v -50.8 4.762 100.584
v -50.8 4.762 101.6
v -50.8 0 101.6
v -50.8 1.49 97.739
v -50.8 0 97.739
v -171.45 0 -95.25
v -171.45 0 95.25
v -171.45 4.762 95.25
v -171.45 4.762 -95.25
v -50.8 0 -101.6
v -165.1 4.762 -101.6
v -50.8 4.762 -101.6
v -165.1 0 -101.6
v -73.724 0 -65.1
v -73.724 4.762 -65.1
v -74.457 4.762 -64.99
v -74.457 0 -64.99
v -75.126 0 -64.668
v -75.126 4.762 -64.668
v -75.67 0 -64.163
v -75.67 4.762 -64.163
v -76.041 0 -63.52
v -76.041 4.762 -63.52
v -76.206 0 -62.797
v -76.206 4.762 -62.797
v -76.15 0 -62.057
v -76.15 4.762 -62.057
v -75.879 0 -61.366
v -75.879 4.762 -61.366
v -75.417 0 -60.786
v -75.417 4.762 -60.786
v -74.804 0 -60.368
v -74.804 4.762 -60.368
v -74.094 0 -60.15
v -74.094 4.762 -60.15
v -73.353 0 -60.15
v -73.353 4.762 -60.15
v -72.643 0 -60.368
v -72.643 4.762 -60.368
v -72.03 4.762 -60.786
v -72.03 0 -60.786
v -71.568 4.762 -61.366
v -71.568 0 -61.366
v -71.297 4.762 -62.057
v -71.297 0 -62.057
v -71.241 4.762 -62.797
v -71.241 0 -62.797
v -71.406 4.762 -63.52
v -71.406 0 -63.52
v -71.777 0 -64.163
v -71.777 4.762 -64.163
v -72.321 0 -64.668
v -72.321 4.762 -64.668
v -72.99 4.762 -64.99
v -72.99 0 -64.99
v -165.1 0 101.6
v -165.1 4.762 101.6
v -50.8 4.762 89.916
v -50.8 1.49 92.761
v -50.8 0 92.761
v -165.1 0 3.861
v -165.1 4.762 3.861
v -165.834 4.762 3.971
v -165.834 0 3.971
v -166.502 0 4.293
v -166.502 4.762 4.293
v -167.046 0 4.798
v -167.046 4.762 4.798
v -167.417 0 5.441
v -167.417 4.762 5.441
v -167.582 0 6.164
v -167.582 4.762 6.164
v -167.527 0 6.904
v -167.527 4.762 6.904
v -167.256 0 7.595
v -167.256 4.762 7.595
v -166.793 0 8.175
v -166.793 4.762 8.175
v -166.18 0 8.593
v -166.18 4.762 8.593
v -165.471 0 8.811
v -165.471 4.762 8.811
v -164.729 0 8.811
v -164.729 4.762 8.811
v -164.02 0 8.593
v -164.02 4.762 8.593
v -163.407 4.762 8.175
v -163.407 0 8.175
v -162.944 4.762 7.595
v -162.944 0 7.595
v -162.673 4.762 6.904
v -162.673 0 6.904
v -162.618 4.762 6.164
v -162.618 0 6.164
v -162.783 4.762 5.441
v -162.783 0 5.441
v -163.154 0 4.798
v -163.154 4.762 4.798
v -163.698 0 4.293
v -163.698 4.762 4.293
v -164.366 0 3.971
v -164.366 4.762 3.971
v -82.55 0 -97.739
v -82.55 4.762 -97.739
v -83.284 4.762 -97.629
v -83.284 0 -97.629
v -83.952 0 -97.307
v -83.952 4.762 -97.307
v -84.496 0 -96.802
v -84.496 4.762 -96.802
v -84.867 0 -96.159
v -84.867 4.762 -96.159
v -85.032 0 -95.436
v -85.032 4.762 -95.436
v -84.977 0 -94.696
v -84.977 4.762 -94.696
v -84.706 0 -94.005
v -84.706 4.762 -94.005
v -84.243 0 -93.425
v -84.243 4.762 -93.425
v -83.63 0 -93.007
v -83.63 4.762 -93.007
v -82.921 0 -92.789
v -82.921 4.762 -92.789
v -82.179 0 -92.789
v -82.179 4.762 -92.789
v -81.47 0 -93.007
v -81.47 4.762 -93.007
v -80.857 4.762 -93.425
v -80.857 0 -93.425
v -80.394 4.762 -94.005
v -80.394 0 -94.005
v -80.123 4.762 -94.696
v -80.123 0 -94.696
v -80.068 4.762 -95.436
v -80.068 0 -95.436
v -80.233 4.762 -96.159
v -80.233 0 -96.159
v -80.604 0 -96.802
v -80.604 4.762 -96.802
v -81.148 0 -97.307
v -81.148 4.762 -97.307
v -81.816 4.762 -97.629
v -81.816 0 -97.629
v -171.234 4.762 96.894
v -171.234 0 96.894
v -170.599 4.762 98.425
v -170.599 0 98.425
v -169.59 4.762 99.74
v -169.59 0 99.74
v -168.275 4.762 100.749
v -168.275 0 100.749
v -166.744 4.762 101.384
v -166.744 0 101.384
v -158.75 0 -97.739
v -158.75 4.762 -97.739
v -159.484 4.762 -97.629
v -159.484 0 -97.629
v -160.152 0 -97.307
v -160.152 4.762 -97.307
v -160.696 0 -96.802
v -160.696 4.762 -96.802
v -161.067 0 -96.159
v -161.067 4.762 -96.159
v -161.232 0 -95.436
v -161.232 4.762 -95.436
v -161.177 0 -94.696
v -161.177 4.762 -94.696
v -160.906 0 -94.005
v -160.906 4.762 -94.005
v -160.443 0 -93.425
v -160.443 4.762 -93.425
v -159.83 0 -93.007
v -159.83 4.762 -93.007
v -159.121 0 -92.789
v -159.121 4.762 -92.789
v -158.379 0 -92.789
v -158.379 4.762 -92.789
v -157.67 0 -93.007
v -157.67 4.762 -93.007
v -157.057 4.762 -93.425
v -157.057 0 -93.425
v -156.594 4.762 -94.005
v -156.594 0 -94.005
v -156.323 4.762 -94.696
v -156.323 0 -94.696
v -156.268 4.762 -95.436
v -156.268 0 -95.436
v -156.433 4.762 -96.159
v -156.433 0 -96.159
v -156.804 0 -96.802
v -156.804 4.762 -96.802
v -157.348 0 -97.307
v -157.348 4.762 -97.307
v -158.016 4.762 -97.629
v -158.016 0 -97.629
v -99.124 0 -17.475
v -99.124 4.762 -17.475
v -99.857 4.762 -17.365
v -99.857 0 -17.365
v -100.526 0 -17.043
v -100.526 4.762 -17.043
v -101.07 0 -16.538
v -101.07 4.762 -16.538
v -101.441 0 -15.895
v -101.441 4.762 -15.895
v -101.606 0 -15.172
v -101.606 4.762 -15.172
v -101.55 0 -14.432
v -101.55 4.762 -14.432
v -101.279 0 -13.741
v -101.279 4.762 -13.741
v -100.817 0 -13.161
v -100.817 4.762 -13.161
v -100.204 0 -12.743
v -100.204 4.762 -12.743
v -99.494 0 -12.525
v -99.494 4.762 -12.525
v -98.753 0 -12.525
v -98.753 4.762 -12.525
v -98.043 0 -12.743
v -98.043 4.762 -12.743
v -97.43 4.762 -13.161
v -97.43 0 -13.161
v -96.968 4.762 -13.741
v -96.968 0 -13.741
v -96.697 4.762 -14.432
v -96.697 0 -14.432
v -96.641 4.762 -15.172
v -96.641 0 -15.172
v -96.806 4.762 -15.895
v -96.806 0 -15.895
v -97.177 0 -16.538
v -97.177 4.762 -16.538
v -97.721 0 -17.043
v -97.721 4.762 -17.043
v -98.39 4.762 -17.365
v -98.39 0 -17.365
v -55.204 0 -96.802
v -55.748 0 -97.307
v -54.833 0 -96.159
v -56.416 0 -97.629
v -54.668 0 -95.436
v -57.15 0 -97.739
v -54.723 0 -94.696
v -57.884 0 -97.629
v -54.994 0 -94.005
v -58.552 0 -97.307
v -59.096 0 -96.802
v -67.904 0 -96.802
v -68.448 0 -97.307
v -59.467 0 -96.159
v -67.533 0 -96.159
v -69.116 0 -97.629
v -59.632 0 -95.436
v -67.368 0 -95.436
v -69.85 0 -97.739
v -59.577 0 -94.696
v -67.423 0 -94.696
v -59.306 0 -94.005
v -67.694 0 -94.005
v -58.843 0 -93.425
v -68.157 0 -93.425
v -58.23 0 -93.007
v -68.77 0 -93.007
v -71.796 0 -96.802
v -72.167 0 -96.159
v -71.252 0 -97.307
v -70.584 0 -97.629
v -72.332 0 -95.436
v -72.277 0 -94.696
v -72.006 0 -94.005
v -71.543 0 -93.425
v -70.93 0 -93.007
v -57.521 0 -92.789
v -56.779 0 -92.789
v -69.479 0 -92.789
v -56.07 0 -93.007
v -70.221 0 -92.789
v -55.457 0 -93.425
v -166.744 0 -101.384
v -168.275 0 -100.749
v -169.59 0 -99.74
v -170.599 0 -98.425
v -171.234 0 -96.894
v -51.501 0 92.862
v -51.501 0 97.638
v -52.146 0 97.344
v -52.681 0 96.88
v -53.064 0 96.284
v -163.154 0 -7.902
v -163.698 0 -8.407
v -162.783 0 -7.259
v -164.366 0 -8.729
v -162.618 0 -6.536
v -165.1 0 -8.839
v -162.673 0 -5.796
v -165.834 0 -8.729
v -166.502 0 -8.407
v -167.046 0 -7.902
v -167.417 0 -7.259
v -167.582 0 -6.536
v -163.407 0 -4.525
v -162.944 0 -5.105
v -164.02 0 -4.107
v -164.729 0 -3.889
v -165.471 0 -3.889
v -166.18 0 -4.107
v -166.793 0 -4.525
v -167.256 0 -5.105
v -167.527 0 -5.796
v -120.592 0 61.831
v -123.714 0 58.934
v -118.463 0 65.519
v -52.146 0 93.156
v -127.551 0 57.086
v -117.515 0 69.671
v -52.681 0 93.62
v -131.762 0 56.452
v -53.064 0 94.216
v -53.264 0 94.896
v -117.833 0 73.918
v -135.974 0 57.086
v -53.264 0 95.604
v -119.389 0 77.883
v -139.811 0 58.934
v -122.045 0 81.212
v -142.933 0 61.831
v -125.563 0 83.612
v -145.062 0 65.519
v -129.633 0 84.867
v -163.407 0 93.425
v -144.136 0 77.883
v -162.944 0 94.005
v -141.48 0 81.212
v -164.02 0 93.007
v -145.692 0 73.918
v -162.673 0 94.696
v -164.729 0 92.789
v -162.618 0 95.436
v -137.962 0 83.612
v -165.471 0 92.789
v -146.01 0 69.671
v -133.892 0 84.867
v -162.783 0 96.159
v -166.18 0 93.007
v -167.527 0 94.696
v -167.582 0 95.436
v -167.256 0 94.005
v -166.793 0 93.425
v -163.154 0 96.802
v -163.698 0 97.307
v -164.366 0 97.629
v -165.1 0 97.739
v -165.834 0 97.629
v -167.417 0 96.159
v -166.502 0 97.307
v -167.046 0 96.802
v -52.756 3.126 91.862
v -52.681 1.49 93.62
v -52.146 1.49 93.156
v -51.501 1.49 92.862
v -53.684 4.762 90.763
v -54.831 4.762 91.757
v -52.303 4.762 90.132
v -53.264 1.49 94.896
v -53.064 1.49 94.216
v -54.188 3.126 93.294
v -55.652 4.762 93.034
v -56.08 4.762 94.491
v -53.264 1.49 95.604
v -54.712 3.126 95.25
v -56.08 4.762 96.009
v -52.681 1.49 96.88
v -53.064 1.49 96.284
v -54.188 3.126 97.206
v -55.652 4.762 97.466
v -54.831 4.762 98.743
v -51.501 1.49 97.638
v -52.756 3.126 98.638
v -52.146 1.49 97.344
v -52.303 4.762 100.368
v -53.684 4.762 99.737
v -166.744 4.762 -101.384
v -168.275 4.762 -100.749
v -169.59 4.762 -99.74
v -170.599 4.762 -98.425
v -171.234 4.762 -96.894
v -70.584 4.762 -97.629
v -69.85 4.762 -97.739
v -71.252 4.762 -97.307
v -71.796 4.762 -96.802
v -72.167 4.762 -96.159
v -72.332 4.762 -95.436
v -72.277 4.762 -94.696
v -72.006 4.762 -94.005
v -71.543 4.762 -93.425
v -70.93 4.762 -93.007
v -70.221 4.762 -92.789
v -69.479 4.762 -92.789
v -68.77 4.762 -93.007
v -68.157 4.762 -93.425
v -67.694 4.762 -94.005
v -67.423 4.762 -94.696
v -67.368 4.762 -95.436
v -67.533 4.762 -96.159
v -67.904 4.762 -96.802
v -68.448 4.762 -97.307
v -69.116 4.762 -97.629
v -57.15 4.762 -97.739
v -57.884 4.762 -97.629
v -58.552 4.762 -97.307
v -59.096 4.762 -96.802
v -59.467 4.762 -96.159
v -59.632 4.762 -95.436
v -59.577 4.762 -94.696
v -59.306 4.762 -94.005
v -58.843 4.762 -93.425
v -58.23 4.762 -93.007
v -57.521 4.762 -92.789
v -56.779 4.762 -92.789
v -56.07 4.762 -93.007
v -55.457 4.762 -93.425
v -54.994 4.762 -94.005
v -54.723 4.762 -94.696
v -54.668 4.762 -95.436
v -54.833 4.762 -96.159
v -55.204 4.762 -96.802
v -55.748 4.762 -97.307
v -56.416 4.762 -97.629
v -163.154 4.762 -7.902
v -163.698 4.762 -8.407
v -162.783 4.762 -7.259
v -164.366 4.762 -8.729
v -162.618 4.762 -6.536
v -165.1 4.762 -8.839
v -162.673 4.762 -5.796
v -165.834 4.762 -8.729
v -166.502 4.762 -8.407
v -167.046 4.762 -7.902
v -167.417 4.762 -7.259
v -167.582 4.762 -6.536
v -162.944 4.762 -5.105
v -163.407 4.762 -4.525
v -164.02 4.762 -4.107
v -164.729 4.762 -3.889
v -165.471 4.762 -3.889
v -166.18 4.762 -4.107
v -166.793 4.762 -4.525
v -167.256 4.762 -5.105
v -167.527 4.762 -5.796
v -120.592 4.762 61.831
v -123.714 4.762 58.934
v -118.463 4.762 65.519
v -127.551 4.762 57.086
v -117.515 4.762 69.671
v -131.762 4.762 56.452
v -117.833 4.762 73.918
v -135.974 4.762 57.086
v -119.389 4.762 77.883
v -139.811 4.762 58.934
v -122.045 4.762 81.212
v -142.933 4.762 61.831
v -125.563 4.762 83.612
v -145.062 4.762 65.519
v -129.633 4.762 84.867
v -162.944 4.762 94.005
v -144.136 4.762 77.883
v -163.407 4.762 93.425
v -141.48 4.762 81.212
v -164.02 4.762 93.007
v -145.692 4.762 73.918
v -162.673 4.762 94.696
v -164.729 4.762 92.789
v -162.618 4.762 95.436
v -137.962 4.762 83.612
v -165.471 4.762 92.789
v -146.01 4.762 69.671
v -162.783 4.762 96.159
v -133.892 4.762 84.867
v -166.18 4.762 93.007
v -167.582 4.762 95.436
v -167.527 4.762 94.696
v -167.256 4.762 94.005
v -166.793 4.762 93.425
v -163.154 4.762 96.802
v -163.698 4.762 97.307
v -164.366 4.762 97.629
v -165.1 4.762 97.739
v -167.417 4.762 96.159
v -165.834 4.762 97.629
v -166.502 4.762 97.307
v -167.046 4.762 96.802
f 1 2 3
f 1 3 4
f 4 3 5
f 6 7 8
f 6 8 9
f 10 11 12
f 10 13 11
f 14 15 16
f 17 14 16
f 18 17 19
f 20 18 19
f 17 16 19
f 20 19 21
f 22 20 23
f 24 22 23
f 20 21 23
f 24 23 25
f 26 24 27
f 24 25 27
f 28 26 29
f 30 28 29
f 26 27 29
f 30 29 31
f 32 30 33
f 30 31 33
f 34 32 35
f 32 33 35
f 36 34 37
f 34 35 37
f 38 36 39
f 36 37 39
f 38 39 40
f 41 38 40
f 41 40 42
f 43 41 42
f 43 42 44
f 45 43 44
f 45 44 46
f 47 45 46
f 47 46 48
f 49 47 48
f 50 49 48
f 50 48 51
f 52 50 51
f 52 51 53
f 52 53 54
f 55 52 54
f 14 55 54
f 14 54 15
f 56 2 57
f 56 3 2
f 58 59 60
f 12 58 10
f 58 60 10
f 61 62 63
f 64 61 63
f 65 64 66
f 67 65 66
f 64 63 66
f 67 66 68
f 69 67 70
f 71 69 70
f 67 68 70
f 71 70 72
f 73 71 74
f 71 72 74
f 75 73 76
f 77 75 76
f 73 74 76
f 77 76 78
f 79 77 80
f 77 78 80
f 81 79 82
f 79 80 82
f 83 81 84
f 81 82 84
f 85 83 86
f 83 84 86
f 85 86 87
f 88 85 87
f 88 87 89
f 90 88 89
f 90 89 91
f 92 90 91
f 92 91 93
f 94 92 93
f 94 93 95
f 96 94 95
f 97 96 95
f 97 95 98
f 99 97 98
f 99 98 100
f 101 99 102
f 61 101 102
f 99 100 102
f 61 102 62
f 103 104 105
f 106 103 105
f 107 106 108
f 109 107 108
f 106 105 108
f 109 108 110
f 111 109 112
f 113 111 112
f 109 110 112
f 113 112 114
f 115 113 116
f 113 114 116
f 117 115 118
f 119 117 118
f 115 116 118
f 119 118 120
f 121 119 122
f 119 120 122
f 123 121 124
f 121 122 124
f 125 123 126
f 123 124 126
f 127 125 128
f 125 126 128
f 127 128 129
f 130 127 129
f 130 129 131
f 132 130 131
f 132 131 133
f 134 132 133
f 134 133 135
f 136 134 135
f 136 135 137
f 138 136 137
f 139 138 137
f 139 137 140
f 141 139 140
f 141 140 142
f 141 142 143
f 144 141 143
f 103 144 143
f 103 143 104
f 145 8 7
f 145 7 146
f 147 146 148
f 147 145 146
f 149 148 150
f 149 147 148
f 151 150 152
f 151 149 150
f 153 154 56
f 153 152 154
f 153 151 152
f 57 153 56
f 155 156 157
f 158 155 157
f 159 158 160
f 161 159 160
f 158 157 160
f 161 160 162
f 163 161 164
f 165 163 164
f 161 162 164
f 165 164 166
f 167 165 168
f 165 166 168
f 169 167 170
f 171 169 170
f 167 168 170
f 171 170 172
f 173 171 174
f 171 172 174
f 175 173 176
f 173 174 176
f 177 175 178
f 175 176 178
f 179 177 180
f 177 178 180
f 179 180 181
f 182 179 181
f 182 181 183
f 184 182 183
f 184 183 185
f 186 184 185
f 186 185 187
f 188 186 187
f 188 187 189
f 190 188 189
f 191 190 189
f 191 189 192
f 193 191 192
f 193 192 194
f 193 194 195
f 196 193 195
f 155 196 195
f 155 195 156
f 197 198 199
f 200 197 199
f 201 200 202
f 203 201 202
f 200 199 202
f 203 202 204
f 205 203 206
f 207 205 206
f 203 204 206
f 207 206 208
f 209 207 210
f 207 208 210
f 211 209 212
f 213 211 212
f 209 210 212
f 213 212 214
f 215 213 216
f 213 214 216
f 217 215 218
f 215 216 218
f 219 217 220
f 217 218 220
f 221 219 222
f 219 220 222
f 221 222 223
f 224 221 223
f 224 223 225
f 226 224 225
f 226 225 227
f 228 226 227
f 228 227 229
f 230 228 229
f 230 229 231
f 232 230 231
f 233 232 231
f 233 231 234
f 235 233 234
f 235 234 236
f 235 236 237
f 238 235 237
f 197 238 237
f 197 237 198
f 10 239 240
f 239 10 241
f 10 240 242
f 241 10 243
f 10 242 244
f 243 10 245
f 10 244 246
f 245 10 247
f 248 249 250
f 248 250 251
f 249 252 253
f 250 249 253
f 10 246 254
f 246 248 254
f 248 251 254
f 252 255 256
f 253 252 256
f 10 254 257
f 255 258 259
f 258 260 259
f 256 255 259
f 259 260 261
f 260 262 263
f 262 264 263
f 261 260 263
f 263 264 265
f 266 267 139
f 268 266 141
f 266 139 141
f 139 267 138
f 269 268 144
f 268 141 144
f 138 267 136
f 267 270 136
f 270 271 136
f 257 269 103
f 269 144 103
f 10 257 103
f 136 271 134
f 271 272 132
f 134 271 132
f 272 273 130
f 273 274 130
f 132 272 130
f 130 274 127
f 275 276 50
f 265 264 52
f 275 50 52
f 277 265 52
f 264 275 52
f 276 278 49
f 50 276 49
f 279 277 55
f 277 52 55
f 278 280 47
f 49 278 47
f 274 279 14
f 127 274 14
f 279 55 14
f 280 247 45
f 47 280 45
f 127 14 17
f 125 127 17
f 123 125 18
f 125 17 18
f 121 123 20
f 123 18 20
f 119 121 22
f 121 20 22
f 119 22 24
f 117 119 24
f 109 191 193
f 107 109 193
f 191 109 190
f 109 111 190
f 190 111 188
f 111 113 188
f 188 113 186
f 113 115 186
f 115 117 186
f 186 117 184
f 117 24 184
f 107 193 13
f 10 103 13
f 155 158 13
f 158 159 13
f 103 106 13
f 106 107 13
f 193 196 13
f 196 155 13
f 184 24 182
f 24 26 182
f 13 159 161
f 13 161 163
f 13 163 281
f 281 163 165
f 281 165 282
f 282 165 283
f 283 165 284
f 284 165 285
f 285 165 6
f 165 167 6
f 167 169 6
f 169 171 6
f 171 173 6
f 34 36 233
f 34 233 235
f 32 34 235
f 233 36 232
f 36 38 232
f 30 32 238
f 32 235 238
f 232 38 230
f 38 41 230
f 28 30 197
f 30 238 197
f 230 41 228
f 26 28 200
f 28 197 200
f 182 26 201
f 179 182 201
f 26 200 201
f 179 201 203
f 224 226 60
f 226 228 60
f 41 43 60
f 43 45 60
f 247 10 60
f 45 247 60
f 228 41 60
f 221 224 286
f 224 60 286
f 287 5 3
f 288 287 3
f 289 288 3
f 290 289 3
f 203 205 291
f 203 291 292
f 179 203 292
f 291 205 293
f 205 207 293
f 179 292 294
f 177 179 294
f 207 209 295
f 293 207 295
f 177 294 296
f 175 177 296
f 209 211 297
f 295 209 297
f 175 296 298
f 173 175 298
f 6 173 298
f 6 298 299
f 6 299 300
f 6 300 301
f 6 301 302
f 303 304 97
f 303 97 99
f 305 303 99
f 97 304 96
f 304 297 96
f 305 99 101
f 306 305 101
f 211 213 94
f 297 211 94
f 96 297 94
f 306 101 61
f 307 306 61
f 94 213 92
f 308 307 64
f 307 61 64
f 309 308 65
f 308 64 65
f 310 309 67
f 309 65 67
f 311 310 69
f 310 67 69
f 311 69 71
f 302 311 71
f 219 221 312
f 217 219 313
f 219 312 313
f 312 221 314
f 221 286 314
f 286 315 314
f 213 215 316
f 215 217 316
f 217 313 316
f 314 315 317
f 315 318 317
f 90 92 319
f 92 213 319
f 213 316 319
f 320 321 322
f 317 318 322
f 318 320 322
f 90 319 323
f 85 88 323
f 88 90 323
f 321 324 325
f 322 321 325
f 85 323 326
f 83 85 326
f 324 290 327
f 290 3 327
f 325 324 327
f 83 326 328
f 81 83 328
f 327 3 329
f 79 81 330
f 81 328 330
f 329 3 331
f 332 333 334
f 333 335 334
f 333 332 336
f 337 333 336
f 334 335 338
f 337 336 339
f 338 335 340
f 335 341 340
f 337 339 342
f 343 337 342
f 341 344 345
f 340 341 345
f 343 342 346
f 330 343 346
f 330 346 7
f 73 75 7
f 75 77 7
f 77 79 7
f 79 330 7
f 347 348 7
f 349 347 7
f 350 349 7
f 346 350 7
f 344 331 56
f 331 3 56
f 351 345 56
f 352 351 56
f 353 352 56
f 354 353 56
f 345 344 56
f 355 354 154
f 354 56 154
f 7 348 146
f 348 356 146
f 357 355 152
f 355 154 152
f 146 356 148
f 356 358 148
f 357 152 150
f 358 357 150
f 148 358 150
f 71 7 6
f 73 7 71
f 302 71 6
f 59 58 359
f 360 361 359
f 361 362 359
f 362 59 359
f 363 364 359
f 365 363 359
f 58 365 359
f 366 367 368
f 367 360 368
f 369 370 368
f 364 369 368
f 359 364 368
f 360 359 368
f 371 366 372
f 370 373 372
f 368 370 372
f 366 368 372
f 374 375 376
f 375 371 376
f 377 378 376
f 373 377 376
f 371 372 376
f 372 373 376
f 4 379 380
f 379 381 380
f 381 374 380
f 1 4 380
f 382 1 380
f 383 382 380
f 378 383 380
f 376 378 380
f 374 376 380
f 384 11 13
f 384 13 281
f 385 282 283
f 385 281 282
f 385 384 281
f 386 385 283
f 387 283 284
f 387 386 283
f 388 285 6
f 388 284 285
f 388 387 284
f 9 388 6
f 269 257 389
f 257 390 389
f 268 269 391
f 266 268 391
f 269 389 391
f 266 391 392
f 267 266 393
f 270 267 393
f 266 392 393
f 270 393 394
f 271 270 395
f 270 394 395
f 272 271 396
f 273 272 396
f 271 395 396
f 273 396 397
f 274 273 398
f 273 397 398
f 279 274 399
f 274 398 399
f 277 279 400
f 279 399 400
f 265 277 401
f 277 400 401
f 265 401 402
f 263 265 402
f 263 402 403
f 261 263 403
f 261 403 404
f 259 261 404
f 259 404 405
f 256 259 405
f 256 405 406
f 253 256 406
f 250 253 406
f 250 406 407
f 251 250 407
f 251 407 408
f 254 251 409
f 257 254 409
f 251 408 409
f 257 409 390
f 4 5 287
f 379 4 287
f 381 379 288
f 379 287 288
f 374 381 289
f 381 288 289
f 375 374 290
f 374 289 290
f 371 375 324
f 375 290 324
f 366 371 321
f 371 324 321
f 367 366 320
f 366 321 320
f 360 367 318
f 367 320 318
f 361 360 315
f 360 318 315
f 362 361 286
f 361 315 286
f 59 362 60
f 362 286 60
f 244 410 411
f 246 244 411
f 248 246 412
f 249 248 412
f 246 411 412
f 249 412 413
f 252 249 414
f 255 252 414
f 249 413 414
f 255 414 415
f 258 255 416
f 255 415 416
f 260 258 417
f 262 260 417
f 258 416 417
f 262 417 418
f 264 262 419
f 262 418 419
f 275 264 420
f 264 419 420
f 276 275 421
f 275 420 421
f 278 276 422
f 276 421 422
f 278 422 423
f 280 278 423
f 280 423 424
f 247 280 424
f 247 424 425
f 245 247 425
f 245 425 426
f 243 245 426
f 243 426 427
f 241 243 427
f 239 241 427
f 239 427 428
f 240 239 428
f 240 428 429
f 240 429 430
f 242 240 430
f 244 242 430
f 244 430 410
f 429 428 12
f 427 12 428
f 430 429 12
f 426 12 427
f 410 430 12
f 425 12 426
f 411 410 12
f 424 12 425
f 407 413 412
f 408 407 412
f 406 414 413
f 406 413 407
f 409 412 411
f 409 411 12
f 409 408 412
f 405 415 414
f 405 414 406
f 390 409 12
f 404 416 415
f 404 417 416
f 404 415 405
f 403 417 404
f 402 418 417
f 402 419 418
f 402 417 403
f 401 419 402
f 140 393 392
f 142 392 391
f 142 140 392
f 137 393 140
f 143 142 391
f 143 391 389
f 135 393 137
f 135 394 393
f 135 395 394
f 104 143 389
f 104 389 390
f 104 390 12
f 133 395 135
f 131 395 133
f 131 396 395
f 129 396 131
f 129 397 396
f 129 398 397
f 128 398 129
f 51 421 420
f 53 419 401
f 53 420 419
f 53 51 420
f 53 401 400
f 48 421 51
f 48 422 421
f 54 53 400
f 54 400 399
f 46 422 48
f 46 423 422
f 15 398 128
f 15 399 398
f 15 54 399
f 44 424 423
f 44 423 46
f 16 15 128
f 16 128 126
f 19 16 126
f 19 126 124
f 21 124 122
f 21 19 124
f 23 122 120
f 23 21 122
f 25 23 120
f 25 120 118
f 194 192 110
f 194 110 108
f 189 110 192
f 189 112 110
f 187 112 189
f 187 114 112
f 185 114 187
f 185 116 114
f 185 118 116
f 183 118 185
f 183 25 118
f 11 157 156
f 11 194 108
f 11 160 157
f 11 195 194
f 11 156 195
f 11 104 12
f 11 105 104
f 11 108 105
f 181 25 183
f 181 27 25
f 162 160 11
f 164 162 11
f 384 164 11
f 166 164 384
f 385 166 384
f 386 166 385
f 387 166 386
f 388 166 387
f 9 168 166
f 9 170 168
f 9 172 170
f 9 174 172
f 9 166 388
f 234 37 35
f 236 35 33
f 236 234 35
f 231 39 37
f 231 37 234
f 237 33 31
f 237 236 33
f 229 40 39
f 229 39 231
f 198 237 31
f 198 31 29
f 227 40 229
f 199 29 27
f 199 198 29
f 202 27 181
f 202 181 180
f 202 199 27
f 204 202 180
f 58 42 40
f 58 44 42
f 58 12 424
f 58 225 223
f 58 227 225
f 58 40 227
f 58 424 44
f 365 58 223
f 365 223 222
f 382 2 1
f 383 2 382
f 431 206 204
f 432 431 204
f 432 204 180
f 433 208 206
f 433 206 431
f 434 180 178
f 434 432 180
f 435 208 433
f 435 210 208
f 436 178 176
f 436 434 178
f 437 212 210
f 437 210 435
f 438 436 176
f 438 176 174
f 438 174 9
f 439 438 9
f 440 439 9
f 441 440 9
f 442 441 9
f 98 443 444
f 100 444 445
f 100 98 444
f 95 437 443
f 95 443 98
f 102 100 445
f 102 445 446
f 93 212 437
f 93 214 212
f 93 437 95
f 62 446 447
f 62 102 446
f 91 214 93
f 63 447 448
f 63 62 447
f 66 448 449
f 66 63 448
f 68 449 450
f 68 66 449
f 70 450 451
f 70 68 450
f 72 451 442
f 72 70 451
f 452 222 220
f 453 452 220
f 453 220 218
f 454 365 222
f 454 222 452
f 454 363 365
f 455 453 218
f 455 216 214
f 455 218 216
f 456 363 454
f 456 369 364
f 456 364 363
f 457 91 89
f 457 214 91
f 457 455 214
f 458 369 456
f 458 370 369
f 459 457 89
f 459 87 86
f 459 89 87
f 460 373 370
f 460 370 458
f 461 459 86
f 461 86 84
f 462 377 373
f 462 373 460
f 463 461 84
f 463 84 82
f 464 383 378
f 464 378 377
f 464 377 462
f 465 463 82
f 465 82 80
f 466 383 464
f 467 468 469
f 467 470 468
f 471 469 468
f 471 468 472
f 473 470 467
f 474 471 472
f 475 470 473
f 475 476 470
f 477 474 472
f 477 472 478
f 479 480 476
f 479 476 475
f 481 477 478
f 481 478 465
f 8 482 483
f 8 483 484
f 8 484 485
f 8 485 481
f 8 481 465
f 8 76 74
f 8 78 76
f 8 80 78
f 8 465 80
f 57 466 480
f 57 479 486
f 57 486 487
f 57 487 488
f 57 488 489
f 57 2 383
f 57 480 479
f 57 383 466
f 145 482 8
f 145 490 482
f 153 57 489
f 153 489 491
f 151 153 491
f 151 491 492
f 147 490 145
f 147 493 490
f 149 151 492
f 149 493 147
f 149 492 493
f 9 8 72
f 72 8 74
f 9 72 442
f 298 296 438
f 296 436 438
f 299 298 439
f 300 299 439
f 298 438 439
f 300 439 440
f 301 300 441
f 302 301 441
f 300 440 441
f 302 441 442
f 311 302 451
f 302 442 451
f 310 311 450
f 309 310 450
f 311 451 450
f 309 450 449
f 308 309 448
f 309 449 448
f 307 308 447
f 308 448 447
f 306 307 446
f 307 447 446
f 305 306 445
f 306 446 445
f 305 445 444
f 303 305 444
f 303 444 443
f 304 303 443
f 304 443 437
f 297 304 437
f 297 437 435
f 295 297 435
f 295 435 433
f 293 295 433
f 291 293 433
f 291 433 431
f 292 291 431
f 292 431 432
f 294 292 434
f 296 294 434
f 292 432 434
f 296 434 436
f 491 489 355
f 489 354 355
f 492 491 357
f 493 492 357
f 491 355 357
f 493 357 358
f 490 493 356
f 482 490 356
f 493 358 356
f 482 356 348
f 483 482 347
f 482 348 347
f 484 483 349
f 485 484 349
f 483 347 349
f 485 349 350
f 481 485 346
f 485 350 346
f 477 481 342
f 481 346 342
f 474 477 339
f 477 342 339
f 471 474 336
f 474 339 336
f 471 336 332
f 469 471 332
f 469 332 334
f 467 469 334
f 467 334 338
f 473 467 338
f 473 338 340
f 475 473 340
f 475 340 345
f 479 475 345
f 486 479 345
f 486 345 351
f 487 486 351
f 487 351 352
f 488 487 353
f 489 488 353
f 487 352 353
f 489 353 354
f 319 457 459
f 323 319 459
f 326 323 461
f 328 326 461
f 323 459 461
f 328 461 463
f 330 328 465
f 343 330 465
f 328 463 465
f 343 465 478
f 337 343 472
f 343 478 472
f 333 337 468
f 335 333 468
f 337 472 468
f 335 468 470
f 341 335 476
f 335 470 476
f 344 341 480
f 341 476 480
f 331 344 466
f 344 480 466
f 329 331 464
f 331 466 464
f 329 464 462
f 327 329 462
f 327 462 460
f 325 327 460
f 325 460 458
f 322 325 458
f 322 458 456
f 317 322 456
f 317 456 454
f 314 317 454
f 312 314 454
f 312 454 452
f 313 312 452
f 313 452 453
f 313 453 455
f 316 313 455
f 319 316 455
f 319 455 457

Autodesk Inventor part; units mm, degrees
ref_plane "YZ Plane" through (0, 0, 0) normal (1, 0, 0) x (0, 1, 0)
ref_plane "XZ Plane" through (0, 0, 0) normal (0, 1, 0) x (-1, 0, 0)
ref_plane "XY Plane" through (0, 0, 0) normal (0, 0, 1) x (1, 0, 0)
sketch "Sketch1" plane through (0, 0, 0) normal (0, 1, 0) x (-1, 0, 0)
  line L0 (-107.95, 101.6) -> (107.95, 101.6)
  line L1 (107.95, 101.6) -> (107.95, -101.6) construction
  line L2 (107.95, -101.6) -> (-107.95, -101.6)
  line L3 (-107.95, -101.6) -> (-107.95, 101.6)
  line L4 (-107.95, 101.6) -> (107.95, -101.6) construction
  line L5 (107.95, 101.6) -> (-107.95, -101.6) construction
  circle A0 centre (-65.9765, 70.739) radius 28.575 construction
  line L6 (107.95, 101.6) -> (171.45, 101.6)
  line L7 (171.45, 101.6) -> (171.45, -101.6)
  line L8 (171.45, -101.6) -> (107.95, -101.6)
  line L9 (107.95, -101.6) -> (107.95, 101.6) construction
  circle A1 centre (131.7625, 70.739) radius 28.575 construction
  circle A2 centre (139.7, -44.4992) radius 30.1625 construction
  circle A3 centre (32.8287, 67.1746) radius 75.057 construction
  arc A4 (-42.5309, -101.6) -> (105.9516, 44.4492) centre (-65.9765, 70.739) ccw construction
  line L10 (139.7, -25.9224) -> (139.7, -58.8783) construction
  line L11 (157.6605, -26.5386) -> (139.7, -44.4992) construction
  point P0 (0, 0)
  point P1 (121.7395, -26.5386)
  point P2 (121.7395, -62.4597)
  point P3 (157.6605, -62.4597)
  dimension "d0" = 203.2
  dimension "d1" = 215.9
  dimension "d5" = 57.15
  dimension "d9" = 57.15
  dimension "d10" = 197.739
  dimension "d12" = 115.5112
  dimension "d13" = 60.325
  dimension "d14" = 150.114
  dimension "d15" = 172.339
  dimension "d17" = 173.9265
  dimension "d18" = 173.9265
  dimension "d28" = 25.4
  dimension "d31" = 360
  dimension "d33" = 45
  dimension "d79" = 279.4
extrude "Plate1" add sketch "Sketch1" along normal blind 4.7625
hole "Hole1" at (65.9765, 0, 70.739) at (-131.7625, 0, 70.739) direction (0, 1, 0) diameter 28.575 depth 4.7625 tip angle 118
sketch "Sketch2" plane through (0, 0, 0) normal (0, -1, 0) x (1, 0, 0)
  circle A0 centre (65.9765, 70.739) radius 14.2875 projected
  point P0 (0, 0)
  point P1 (-73.7235, -62.611)
  point P2 (-32.4485, -91.186)
  point P3 (-99.1235, -14.986)
  dimension "d41" = 165.1
  dimension "d42" = 85.725
  dimension "d43" = 161.925
  dimension "d44" = 98.425
  dimension "d45" = 139.7
  dimension "d46" = 133.35
hole "Hole3" at (-32.4485, 0, -91.186) at (-73.7235, 0, -62.611) at (-99.1235, 0, -14.986) direction (0, 1, 0) diameter 4.9784 depth 4.7625 tip angle 118 clearance for "Flat Head Machine Screw (82)" size "#10" standard "Ansi Unified Screw Threads"
sketch "Sketch3" plane through (0, 0, 0) normal (0, -1, 0) x (1, 0, 0)
  line L0 (107.95, -101.6) -> (-171.45, -101.6) projected
  line L1 (107.95, 101.6) -> (107.95, -101.6) projected
  point P0 (0, 0)
  point P1 (95.25, -76.2)
  point P2 (95.25, -25.4)
  dimension "d54" = 50.8
  dimension "d55" = 25.4
  dimension "d56" = 12.7
hole "Hole4" at (95.25, 0, -76.2) at (95.25, 0, -25.4) direction (0, 1, 0) diameter 4.9784 depth 4.7625 tip angle 118 clearance for "Flat Head Machine Screw (82)" size "#10" standard "Ansi Unified Screw Threads"
sketch "Sketch4" plane through (0, 0, 0) normal (0, -1, 0) x (1, 0, 0)
  line L0 (-171.45, -101.6) -> (-171.45, 101.6) projected
  line L1 (107.95, -101.6) -> (-171.45, -101.6) projected
  line L2 (107.95, 101.6) -> (107.95, -101.6) projected
  point P0 (0, 0)
  point P1 (-82.55, -95.25)
  point P2 (-69.85, -95.25)
  point P3 (-57.15, -95.25)
  point P4 (63.5, -95.25)
  point P5 (50.8, -95.25)
  point P6 (76.2, -95.25)
  point P7 (-158.75, -95.25)
  dimension "d64" = 12.7
  dimension "d65" = 12.7
  dimension "d66" = 88.9
  dimension "d67" = 6.35
  dimension "d68" = 6.35
  dimension "d69" = 12.7
  dimension "d70" = 12.7
  dimension "d71" = 31.75
  dimension "d141" = 12.7
hole "Hole5" at (-82.55, 0, -95.25) at (-69.85, 0, -95.25) at (-57.15, 0, -95.25) at (63.5, 0, -95.25) at (50.8, 0, -95.25) at (76.2, 0, -95.25) at (-158.75, 0, -95.25) direction (0, 1, 0) diameter 4.9784 depth 4.7625 tip angle 118 clearance for "Flat Head Machine Screw (82)" size "#10" standard "Ansi Unified Screw Threads"
fillet "Corner Round1" radius 6.35 4 edges at (-171.45, 2.3813, -101.6) (-171.45, 2.3813, 101.6) (107.95, 2.3813, -101.6) (107.95, 2.3813, 101.6)
sketch "Sketch5" plane through (0, 4.7625, 0) normal (0, -1, 0) x (1, 0, 0)
  circle A0 centre (-131.7625, 70.739) radius 14.2875 projected
  circle A1 centre (-131.7625, 70.739) radius 28.575
  circle A2 centre (65.9765, 70.739) radius 14.2875 projected
  circle A3 centre (65.9765, 70.739) radius 28.575
  line L0 (-165.1, 101.6) -> (101.6, 101.6) projected
  line L1 (-171.45, -95.25) -> (-171.45, 95.25) projected
  line L2 (107.95, 95.25) -> (107.95, -95.25) projected
  point P0 (0, 0)
  point P1 (-165.1, 95.25)
  point P2 (101.6, 95.25)
  point P3 (-50.8, 95.25)
  point P4 (-38.1, 95.25)
  point P5 (-25.4, 95.25)
  dimension "d81" = 57.15
  dimension "d82" = 57.15
  dimension "d83" = 6.35
  dimension "d84" = 6.35
  dimension "d85" = 6.35
  dimension "d86" = 114.3
  dimension "d87" = 12.7
  dimension "d88" = 12.7
hole "Hole6" at (-165.1, 4.7625, 95.25) at (101.6, 4.7625, 95.25) at (-50.8, 4.7625, 95.25) at (-25.4, 4.7625, 95.25) direction (0, -1, 0) diameter 4.9784 depth 4.7625 tip angle 118 clearance for "Flat Head Machine Screw (82)" size "#10" standard "Ansi Unified Screw Threads"
sketch "Sketch6" plane through (0, 0, 0) normal (0, -1, 0) x (1, 0, 0)
  line L0 (-171.45, -95.25) -> (-171.45, 95.25) projected
  point P0 (0, 0)
  point P1 (-165.1, -6.35)
  point P2 (-165.1, 6.35)
  dimension "d96" = 12.7
  dimension "d97" = 6.35
  dimension "d98" = 6.35
hole "Hole7" at (-165.1, 0, -6.35) at (-165.1, 0, 6.35) direction (0, 1, 0) diameter 4.9784 depth 4.7625 tip angle 118 clearance for "Flat Head Machine Screw (82)" size "#10" standard "Ansi Unified Screw Threads"
hole "Hole8" at (-25.4, 4.7625, 95.25) at (-50.8, 4.7625, 95.25) direction (0, -1, 0) diameter 4.9784 end through all countersink diameter 10.668 countersink angle 82 clearance for "Flat Head Machine Screw (82)" size "#10" standard "Ansi Unified Screw Threads"
sketch "Sketch9" plane through (0, 0, 0) normal (0, -1, 0) x (1, 0, 0)
  line L0 (101.6, -101.6) -> (-165.1, -101.6) projected
  line L1 (107.95, 101.6) -> (-50.8, 101.6)
  line L2 (-50.8, 101.6) -> (-50.8, -101.6)
  line L3 (-50.8, -101.6) -> (107.95, -101.6)
  line L4 (107.95, -101.6) -> (107.95, 101.6)
  line L5 (-165.1, 101.6) -> (101.6, 101.6) projected
  line L6 (107.95, 95.25) -> (107.95, -95.25) projected
  point P0 (0, 0)
  dimension "d153" = 158.75
extrude "Cut2" cut sketch "Sketch9" against normal blind 4.7625
properties part number "PLATE,KICKER,OUTSIDE" material "Aluminum 6061"
